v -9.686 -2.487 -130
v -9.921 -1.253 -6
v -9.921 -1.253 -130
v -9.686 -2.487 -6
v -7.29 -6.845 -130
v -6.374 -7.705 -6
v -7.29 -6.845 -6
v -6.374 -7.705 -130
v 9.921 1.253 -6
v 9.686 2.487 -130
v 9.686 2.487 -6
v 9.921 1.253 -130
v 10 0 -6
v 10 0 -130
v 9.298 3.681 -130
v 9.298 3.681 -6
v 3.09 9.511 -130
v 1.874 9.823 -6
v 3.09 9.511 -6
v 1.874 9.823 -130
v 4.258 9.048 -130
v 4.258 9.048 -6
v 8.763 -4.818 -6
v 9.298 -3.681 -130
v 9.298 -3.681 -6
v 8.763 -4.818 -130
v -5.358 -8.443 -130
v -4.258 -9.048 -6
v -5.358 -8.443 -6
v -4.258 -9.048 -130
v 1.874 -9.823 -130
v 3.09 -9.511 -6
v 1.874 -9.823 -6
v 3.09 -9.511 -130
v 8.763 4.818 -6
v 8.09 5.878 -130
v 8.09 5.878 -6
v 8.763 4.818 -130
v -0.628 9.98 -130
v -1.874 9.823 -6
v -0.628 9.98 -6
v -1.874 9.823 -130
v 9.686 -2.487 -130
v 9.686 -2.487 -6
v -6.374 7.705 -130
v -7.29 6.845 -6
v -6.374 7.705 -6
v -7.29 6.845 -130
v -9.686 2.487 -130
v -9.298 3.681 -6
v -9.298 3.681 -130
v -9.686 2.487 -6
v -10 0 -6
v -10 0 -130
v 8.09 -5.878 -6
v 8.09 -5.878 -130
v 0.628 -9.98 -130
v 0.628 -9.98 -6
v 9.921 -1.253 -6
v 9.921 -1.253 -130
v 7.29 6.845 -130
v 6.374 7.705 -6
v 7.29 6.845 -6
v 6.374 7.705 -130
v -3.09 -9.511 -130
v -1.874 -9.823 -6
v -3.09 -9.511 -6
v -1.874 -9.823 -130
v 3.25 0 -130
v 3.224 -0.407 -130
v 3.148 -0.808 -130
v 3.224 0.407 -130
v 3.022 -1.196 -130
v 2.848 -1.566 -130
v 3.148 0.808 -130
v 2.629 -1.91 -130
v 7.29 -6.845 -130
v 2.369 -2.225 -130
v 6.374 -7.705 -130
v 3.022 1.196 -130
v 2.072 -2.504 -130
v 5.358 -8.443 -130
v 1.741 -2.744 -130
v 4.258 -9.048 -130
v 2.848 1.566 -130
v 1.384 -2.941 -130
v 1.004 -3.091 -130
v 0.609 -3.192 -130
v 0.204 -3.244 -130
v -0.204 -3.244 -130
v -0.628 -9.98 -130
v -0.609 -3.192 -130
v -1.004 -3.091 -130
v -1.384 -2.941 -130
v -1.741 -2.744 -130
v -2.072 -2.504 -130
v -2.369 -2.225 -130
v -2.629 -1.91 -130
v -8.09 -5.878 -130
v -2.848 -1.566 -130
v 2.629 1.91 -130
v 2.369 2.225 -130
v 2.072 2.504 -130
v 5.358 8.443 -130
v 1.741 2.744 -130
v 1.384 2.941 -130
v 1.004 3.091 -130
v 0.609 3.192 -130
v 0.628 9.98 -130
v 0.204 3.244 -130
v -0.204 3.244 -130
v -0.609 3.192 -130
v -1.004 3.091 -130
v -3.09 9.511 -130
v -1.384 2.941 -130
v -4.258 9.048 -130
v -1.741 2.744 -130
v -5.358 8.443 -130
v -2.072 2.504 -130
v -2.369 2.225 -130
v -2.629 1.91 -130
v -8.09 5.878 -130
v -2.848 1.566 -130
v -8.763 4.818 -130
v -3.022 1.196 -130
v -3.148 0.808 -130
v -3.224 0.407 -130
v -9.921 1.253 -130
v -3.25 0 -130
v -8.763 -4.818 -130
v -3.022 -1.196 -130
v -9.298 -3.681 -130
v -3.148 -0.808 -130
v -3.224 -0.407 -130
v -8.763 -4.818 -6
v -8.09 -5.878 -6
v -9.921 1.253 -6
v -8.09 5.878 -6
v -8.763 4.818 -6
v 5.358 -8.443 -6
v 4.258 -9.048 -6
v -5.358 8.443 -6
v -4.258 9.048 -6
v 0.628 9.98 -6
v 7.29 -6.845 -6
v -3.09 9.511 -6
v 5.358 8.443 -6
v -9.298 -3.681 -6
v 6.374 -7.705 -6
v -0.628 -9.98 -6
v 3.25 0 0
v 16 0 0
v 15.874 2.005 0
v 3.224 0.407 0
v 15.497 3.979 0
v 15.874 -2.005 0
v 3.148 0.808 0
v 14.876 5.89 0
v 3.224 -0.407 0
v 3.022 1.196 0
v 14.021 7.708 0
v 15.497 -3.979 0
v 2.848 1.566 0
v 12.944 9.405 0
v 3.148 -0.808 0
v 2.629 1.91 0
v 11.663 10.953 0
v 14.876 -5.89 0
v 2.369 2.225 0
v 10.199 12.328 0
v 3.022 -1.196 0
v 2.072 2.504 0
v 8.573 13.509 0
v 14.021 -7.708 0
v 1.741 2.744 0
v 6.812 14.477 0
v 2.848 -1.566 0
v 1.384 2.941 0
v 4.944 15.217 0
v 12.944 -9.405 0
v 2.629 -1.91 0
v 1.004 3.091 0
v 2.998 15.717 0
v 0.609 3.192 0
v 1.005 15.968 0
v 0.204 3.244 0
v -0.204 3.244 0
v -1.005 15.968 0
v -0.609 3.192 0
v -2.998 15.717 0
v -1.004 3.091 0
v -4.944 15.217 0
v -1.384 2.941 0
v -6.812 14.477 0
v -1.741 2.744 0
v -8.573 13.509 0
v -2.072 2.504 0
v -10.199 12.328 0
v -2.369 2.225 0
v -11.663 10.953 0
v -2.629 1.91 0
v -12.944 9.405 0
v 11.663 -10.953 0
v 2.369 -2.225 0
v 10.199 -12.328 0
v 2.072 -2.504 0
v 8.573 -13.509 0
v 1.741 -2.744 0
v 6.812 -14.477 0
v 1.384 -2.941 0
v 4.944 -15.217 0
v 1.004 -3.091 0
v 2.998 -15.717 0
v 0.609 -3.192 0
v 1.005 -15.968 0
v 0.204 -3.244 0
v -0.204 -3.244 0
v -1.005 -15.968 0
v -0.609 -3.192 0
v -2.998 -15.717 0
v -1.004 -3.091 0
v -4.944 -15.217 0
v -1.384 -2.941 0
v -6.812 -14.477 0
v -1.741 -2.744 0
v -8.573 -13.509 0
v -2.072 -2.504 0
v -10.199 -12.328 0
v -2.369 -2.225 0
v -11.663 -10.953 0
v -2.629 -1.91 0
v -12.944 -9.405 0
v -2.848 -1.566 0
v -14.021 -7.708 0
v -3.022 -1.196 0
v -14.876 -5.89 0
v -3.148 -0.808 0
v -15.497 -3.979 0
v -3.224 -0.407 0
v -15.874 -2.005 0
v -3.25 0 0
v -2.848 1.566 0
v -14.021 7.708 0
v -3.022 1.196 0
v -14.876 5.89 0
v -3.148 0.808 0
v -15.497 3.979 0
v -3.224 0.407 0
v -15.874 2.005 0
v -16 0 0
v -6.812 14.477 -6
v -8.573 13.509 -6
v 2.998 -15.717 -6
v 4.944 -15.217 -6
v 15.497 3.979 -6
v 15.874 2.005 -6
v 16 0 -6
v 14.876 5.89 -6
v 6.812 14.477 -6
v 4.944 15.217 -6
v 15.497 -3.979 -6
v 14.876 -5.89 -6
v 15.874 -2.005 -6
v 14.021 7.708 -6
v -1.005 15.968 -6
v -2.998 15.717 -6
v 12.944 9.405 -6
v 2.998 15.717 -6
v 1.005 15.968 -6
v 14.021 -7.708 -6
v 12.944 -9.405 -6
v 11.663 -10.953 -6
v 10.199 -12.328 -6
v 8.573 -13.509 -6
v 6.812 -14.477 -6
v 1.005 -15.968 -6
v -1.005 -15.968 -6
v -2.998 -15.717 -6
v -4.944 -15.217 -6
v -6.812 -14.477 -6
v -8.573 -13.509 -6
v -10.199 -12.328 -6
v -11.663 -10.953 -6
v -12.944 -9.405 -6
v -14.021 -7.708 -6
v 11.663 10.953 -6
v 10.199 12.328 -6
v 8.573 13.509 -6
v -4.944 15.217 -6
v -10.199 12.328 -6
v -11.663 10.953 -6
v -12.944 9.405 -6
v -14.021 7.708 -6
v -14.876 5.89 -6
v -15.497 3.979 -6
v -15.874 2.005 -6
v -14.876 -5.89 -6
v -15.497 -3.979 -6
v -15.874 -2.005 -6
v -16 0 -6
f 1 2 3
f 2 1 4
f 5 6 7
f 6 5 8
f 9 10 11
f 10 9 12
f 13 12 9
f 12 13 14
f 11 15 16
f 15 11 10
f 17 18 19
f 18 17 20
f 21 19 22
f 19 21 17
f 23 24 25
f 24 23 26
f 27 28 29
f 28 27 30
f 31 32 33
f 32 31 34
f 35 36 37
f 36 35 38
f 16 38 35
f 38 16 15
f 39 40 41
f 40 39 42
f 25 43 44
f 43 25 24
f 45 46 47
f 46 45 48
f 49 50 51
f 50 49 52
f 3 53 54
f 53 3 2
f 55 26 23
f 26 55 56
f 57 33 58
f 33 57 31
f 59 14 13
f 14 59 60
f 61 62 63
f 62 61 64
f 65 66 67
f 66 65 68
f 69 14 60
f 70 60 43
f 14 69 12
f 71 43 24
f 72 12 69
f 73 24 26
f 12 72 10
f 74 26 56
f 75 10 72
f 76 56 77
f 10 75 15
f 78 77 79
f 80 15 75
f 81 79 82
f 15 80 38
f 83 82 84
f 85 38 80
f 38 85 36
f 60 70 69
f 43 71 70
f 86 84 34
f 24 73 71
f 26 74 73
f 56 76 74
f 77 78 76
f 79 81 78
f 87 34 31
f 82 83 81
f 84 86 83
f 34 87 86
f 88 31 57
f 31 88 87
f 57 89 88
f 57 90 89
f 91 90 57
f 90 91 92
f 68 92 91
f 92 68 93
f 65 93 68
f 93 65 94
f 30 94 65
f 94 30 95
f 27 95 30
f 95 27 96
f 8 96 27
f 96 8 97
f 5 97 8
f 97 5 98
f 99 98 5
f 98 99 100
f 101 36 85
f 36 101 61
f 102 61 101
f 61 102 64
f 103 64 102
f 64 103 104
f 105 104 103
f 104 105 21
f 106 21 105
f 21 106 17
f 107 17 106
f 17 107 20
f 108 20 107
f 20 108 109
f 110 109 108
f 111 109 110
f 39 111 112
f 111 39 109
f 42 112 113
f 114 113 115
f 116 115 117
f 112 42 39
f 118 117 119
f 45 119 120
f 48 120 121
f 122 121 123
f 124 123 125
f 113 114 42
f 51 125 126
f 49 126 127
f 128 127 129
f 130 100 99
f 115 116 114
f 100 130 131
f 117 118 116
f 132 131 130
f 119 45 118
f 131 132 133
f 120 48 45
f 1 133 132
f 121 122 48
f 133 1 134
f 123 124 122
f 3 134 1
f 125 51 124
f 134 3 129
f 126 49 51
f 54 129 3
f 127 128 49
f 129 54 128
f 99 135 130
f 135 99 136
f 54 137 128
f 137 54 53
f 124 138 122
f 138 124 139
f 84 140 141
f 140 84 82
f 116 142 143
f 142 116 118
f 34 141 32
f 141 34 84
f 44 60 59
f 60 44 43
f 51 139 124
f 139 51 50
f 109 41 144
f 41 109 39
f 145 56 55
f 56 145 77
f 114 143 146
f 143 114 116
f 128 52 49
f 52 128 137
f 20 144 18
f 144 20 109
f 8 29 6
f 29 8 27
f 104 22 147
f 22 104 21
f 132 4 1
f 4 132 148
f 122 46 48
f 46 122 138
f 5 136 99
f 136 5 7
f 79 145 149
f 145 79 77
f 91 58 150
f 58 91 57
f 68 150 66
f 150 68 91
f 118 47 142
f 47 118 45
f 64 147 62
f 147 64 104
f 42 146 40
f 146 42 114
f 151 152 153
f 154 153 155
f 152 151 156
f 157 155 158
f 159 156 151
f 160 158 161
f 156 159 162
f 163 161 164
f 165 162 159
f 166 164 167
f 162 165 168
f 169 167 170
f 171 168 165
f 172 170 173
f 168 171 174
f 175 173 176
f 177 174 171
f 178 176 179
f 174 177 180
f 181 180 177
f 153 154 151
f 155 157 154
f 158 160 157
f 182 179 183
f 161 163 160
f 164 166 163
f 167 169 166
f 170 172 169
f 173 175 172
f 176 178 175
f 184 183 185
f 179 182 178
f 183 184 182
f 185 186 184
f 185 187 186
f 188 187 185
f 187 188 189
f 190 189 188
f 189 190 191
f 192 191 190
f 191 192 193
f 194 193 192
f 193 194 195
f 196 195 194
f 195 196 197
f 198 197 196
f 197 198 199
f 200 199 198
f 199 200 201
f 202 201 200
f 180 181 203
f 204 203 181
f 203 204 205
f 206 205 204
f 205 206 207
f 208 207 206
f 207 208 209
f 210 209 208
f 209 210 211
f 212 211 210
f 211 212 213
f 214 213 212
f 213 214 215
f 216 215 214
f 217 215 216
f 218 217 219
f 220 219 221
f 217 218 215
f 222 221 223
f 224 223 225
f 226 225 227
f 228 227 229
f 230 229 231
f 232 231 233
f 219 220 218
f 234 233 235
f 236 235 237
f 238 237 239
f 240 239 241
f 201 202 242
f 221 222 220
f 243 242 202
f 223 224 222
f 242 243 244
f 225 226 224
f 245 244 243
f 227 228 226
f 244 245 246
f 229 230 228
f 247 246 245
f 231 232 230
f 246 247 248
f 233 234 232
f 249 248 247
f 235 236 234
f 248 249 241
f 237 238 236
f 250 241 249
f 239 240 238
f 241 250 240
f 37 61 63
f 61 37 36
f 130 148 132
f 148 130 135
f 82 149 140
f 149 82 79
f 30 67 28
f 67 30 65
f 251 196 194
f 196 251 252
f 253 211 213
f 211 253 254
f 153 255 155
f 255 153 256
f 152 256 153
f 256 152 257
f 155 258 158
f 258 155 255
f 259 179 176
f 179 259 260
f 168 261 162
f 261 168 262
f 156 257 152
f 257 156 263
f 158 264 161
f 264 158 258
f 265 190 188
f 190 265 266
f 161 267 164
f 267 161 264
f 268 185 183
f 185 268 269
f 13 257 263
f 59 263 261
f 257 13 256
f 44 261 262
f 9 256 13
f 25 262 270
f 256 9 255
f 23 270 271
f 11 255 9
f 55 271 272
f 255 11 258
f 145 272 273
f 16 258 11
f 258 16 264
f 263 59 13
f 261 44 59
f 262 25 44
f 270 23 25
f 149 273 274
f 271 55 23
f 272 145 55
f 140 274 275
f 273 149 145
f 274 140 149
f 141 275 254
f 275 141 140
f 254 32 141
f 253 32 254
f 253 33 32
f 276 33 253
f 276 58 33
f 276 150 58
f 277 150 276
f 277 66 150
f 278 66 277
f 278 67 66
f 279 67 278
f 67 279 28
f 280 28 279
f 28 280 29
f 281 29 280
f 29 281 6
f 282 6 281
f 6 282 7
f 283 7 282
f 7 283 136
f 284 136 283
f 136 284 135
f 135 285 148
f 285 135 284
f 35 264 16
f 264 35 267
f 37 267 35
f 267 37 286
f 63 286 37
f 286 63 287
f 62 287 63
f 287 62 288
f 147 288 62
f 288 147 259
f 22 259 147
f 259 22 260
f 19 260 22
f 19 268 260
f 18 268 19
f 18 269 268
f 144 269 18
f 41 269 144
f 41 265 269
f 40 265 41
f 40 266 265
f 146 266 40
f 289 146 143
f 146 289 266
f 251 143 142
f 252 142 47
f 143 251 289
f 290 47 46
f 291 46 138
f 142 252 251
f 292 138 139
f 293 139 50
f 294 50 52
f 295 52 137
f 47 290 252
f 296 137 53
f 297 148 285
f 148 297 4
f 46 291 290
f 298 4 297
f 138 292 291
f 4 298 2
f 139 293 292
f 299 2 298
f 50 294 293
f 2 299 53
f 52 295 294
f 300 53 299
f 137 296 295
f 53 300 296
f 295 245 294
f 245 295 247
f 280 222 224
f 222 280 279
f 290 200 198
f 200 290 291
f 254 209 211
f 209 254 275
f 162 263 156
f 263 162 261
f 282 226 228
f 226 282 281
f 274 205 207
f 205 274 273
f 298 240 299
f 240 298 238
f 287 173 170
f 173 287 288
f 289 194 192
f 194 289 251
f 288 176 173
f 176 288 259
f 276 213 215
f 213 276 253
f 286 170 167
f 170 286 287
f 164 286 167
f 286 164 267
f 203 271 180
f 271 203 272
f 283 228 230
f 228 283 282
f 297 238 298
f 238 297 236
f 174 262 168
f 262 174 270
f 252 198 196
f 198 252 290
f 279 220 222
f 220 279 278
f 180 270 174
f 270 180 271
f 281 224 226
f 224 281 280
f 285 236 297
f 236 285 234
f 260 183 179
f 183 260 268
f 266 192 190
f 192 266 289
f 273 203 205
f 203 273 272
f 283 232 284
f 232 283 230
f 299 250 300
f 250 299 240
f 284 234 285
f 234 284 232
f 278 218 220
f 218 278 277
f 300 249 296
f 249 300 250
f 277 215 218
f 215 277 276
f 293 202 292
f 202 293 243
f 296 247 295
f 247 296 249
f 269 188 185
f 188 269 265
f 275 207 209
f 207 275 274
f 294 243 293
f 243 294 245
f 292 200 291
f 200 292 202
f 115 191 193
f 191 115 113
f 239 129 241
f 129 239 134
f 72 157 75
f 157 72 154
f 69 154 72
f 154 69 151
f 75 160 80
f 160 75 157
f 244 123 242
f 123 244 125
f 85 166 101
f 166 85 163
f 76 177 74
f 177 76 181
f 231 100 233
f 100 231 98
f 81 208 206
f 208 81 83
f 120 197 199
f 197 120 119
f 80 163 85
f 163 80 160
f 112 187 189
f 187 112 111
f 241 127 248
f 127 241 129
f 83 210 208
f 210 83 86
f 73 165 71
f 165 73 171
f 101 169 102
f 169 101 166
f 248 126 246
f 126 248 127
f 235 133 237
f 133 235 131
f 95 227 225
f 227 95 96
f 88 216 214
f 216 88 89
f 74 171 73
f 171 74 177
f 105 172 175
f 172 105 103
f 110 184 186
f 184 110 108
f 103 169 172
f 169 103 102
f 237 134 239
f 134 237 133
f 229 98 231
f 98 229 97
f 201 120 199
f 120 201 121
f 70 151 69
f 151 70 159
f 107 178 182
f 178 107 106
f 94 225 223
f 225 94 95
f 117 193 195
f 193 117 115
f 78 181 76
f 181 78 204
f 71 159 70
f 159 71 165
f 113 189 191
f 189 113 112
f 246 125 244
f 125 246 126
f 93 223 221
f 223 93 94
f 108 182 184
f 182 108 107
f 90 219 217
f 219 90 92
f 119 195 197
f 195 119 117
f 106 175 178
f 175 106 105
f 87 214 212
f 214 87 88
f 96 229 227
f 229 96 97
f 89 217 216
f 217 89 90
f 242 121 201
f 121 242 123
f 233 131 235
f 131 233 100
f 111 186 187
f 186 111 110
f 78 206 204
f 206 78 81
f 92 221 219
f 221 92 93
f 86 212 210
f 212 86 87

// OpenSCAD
$fn = 50;


difference() {
	union() {
		translate(v = [0, 0, -130.0000000000]) {
			cylinder(h = 130, r = 10.0000000000);
		}
		translate(v = [0, 0, -6.0000000000]) {
			cylinder(h = 6, r = 16.0000000000);
		}
	}
	union() {
		#translate(v = [0, 0, -130]) {
			cylinder(h = 130, r = 3.2500000000);
		}
	}
}
